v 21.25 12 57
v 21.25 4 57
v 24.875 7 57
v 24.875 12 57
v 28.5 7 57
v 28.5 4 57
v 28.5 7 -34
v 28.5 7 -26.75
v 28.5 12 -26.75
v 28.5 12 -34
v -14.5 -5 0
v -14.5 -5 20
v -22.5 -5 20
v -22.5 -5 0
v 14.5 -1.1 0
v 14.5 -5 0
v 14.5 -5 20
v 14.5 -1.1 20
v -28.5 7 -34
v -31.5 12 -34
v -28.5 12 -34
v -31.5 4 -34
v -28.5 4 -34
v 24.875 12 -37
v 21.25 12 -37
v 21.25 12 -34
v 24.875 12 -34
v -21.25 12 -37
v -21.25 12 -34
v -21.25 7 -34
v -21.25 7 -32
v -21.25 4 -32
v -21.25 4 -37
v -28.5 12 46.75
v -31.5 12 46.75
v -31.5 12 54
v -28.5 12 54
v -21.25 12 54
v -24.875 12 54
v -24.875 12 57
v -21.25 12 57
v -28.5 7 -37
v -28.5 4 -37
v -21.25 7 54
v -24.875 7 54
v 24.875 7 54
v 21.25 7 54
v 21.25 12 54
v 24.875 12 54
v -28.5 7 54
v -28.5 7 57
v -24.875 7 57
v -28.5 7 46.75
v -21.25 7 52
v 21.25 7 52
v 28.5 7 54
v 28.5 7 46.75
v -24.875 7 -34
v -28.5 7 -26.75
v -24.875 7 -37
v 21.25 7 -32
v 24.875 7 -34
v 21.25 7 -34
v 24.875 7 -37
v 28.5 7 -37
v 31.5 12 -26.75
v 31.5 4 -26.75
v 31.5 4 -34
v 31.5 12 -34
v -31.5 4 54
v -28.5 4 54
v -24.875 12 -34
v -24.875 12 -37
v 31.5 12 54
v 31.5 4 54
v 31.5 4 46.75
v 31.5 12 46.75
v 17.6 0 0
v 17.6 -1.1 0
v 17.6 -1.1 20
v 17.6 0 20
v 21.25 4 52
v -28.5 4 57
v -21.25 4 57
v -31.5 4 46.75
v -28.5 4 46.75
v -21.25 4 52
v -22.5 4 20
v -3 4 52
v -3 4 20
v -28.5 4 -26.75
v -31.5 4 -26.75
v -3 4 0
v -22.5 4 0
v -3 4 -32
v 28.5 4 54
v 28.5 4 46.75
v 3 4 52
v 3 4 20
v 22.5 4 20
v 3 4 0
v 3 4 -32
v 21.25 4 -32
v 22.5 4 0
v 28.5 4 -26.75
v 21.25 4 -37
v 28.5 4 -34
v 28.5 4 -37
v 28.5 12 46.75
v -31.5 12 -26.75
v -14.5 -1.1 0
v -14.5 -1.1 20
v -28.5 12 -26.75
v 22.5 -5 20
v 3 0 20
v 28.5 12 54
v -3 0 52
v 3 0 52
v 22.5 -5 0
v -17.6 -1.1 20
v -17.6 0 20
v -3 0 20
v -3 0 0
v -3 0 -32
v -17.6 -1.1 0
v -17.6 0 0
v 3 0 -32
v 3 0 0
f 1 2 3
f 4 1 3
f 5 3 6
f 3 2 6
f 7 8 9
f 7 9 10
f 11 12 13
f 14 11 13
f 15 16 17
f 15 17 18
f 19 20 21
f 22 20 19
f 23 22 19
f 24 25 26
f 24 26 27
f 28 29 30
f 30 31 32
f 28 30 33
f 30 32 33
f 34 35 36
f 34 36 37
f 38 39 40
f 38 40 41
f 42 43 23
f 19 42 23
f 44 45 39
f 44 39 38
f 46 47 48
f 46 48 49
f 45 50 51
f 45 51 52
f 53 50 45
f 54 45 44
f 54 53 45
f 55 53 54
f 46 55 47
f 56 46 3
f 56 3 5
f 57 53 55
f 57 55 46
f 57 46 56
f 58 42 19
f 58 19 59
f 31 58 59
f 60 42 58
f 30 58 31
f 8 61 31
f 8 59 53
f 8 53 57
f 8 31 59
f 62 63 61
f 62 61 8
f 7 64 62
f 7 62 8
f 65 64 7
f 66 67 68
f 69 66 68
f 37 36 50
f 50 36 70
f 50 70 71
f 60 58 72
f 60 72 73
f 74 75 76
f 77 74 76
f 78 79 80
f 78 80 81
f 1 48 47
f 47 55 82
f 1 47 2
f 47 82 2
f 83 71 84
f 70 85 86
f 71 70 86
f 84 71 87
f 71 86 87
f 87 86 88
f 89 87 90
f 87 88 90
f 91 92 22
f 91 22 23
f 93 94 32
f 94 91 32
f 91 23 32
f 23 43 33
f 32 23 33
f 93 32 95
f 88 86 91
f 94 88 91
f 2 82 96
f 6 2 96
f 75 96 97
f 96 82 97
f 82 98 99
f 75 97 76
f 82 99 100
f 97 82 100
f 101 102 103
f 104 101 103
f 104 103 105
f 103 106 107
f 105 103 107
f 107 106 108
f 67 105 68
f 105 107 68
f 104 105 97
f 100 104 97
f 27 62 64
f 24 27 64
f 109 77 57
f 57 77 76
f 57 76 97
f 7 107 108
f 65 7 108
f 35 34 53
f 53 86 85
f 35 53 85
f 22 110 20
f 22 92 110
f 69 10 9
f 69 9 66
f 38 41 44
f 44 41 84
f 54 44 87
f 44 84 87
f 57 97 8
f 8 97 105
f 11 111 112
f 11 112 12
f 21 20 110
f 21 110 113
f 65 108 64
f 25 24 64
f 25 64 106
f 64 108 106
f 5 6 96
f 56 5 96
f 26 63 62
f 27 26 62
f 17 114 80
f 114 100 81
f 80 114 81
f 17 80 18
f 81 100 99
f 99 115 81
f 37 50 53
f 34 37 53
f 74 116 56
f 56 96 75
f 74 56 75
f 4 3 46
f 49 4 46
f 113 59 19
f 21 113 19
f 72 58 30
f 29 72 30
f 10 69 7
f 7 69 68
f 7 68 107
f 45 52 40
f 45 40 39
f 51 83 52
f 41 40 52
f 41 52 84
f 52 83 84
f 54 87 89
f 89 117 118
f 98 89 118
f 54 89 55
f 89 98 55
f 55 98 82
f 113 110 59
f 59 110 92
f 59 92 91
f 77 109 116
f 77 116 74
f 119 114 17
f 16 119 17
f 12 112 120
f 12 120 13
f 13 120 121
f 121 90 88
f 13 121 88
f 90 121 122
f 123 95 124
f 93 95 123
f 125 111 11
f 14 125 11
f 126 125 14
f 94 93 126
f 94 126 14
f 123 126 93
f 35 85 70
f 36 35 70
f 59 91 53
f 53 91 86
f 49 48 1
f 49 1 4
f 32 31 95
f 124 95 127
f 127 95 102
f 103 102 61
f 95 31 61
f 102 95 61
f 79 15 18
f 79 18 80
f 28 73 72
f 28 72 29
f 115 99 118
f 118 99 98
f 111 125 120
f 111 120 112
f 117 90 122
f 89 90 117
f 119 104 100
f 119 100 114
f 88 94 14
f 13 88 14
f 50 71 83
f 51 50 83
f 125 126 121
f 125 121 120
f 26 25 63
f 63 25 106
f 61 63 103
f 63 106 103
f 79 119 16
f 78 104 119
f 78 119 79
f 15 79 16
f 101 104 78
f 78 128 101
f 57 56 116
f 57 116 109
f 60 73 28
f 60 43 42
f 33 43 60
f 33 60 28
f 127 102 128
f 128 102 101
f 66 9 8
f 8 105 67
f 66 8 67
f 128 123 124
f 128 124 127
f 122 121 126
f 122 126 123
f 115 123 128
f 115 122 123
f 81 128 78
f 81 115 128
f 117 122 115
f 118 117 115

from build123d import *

# Parameters (mm, degrees)
BOSS_EXTRUDE1_DEPTH = 20
BOSS_EXTRUDE2_DEPTH = 3
SKETCH4_W           = 3
SKETCH4_H           = 7.25
BOSS_EXTRUDE3_DEPTH = 5
SKETCH5_W           = 3.625
SKETCH5_H           = 3
BOSS_EXTRUDE4_DEPTH = 5
SKETCH6_W           = 6
SKETCH6_H           = 84
BOSS_EXTRUDE5_DEPTH = 4


with BuildPart() as part:
    # Sketch2 → Boss-Extrude1 (new body)
    with BuildSketch(Plane.XY):
        Polygon((-17.6, 0), (-17.6, -1.1), (-14.5, -1.1), (-14.5, -5), (-22.5, -5), (-22.5, 0), (-22.5, 4), (22.5, 4), (22.5, -5), (14.5, -5), (14.5, -1.1), (17.6, -1.1), (17.6, 0), align=None)
    extrude(amount=BOSS_EXTRUDE1_DEPTH)

    # Sketch3 → Boss-Extrude2 (add)
    with BuildSketch(Plane(origin=(0, 4, 0), x_dir=(1, 0, 0), z_dir=(0, 1, 0))):
        Polygon((-21.25, -52), (21.25, -52), (21.25, -54), (21.25, -57), (28.5, -57), (28.5, -54), (31.5, -54), (31.5, -46.75), (28.5, -46.75), (28.5, 26.75), (31.5, 26.75), (31.5, 34), (28.5, 34), (28.5, 37), (21.25, 37), (21.25, 34), (21.25, 32), (-21.25, 32), (-21.25, 34), (-21.25, 37), (-28.5, 37), (-28.5, 34), (-31.5, 34), (-31.5, 26.75), (-28.5, 26.75), (-28.5, -46.75), (-31.5, -46.75), (-31.5, -54), (-28.5, -54), (-28.5, -57), (-21.25, -57), (-21.25, -54), align=None)
    extrude(amount=BOSS_EXTRUDE2_DEPTH)

    # Sketch4 → Boss-Extrude3 (add)
    with BuildSketch(Plane(origin=(0, 7, 0), x_dir=(1, 0, 0), z_dir=(0, 1, 0))):
        with Locations((-30, 30.375)):
            Rectangle(SKETCH4_W, SKETCH4_H)
        with Locations((30, 30.375)):
            Rectangle(SKETCH4_W, SKETCH4_H)
        with Locations((30, -50.375)):
            Rectangle(SKETCH4_W, SKETCH4_H)
        with Locations((-30, -50.375)):
            Rectangle(SKETCH4_W, SKETCH4_H)
    extrude(amount=BOSS_EXTRUDE3_DEPTH)

    # Sketch5 → Boss-Extrude4 (add)
    with BuildSketch(Plane(origin=(0, 7, 0), x_dir=(1, 0, 0), z_dir=(0, 1, 0))):
        with Locations((-23.0625, 35.5)):
            Rectangle(SKETCH5_W, SKETCH5_H)
        with Locations((23.0625, 35.5)):
            Rectangle(SKETCH5_W, SKETCH5_H)
        with Locations((23.0625, -55.5)):
            Rectangle(SKETCH5_W, SKETCH5_H)
        with Locations((-23.0625, -55.5)):
            Rectangle(SKETCH5_W, SKETCH5_H)
    extrude(amount=BOSS_EXTRUDE4_DEPTH)

    # Sketch6 → Boss-Extrude5 (add)
    with BuildSketch(Plane.XZ.offset(-4)):
        with Locations((0, 10)):
            Rectangle(SKETCH6_W, SKETCH6_H)
    extrude(amount=BOSS_EXTRUDE5_DEPTH)


solid = part.part
